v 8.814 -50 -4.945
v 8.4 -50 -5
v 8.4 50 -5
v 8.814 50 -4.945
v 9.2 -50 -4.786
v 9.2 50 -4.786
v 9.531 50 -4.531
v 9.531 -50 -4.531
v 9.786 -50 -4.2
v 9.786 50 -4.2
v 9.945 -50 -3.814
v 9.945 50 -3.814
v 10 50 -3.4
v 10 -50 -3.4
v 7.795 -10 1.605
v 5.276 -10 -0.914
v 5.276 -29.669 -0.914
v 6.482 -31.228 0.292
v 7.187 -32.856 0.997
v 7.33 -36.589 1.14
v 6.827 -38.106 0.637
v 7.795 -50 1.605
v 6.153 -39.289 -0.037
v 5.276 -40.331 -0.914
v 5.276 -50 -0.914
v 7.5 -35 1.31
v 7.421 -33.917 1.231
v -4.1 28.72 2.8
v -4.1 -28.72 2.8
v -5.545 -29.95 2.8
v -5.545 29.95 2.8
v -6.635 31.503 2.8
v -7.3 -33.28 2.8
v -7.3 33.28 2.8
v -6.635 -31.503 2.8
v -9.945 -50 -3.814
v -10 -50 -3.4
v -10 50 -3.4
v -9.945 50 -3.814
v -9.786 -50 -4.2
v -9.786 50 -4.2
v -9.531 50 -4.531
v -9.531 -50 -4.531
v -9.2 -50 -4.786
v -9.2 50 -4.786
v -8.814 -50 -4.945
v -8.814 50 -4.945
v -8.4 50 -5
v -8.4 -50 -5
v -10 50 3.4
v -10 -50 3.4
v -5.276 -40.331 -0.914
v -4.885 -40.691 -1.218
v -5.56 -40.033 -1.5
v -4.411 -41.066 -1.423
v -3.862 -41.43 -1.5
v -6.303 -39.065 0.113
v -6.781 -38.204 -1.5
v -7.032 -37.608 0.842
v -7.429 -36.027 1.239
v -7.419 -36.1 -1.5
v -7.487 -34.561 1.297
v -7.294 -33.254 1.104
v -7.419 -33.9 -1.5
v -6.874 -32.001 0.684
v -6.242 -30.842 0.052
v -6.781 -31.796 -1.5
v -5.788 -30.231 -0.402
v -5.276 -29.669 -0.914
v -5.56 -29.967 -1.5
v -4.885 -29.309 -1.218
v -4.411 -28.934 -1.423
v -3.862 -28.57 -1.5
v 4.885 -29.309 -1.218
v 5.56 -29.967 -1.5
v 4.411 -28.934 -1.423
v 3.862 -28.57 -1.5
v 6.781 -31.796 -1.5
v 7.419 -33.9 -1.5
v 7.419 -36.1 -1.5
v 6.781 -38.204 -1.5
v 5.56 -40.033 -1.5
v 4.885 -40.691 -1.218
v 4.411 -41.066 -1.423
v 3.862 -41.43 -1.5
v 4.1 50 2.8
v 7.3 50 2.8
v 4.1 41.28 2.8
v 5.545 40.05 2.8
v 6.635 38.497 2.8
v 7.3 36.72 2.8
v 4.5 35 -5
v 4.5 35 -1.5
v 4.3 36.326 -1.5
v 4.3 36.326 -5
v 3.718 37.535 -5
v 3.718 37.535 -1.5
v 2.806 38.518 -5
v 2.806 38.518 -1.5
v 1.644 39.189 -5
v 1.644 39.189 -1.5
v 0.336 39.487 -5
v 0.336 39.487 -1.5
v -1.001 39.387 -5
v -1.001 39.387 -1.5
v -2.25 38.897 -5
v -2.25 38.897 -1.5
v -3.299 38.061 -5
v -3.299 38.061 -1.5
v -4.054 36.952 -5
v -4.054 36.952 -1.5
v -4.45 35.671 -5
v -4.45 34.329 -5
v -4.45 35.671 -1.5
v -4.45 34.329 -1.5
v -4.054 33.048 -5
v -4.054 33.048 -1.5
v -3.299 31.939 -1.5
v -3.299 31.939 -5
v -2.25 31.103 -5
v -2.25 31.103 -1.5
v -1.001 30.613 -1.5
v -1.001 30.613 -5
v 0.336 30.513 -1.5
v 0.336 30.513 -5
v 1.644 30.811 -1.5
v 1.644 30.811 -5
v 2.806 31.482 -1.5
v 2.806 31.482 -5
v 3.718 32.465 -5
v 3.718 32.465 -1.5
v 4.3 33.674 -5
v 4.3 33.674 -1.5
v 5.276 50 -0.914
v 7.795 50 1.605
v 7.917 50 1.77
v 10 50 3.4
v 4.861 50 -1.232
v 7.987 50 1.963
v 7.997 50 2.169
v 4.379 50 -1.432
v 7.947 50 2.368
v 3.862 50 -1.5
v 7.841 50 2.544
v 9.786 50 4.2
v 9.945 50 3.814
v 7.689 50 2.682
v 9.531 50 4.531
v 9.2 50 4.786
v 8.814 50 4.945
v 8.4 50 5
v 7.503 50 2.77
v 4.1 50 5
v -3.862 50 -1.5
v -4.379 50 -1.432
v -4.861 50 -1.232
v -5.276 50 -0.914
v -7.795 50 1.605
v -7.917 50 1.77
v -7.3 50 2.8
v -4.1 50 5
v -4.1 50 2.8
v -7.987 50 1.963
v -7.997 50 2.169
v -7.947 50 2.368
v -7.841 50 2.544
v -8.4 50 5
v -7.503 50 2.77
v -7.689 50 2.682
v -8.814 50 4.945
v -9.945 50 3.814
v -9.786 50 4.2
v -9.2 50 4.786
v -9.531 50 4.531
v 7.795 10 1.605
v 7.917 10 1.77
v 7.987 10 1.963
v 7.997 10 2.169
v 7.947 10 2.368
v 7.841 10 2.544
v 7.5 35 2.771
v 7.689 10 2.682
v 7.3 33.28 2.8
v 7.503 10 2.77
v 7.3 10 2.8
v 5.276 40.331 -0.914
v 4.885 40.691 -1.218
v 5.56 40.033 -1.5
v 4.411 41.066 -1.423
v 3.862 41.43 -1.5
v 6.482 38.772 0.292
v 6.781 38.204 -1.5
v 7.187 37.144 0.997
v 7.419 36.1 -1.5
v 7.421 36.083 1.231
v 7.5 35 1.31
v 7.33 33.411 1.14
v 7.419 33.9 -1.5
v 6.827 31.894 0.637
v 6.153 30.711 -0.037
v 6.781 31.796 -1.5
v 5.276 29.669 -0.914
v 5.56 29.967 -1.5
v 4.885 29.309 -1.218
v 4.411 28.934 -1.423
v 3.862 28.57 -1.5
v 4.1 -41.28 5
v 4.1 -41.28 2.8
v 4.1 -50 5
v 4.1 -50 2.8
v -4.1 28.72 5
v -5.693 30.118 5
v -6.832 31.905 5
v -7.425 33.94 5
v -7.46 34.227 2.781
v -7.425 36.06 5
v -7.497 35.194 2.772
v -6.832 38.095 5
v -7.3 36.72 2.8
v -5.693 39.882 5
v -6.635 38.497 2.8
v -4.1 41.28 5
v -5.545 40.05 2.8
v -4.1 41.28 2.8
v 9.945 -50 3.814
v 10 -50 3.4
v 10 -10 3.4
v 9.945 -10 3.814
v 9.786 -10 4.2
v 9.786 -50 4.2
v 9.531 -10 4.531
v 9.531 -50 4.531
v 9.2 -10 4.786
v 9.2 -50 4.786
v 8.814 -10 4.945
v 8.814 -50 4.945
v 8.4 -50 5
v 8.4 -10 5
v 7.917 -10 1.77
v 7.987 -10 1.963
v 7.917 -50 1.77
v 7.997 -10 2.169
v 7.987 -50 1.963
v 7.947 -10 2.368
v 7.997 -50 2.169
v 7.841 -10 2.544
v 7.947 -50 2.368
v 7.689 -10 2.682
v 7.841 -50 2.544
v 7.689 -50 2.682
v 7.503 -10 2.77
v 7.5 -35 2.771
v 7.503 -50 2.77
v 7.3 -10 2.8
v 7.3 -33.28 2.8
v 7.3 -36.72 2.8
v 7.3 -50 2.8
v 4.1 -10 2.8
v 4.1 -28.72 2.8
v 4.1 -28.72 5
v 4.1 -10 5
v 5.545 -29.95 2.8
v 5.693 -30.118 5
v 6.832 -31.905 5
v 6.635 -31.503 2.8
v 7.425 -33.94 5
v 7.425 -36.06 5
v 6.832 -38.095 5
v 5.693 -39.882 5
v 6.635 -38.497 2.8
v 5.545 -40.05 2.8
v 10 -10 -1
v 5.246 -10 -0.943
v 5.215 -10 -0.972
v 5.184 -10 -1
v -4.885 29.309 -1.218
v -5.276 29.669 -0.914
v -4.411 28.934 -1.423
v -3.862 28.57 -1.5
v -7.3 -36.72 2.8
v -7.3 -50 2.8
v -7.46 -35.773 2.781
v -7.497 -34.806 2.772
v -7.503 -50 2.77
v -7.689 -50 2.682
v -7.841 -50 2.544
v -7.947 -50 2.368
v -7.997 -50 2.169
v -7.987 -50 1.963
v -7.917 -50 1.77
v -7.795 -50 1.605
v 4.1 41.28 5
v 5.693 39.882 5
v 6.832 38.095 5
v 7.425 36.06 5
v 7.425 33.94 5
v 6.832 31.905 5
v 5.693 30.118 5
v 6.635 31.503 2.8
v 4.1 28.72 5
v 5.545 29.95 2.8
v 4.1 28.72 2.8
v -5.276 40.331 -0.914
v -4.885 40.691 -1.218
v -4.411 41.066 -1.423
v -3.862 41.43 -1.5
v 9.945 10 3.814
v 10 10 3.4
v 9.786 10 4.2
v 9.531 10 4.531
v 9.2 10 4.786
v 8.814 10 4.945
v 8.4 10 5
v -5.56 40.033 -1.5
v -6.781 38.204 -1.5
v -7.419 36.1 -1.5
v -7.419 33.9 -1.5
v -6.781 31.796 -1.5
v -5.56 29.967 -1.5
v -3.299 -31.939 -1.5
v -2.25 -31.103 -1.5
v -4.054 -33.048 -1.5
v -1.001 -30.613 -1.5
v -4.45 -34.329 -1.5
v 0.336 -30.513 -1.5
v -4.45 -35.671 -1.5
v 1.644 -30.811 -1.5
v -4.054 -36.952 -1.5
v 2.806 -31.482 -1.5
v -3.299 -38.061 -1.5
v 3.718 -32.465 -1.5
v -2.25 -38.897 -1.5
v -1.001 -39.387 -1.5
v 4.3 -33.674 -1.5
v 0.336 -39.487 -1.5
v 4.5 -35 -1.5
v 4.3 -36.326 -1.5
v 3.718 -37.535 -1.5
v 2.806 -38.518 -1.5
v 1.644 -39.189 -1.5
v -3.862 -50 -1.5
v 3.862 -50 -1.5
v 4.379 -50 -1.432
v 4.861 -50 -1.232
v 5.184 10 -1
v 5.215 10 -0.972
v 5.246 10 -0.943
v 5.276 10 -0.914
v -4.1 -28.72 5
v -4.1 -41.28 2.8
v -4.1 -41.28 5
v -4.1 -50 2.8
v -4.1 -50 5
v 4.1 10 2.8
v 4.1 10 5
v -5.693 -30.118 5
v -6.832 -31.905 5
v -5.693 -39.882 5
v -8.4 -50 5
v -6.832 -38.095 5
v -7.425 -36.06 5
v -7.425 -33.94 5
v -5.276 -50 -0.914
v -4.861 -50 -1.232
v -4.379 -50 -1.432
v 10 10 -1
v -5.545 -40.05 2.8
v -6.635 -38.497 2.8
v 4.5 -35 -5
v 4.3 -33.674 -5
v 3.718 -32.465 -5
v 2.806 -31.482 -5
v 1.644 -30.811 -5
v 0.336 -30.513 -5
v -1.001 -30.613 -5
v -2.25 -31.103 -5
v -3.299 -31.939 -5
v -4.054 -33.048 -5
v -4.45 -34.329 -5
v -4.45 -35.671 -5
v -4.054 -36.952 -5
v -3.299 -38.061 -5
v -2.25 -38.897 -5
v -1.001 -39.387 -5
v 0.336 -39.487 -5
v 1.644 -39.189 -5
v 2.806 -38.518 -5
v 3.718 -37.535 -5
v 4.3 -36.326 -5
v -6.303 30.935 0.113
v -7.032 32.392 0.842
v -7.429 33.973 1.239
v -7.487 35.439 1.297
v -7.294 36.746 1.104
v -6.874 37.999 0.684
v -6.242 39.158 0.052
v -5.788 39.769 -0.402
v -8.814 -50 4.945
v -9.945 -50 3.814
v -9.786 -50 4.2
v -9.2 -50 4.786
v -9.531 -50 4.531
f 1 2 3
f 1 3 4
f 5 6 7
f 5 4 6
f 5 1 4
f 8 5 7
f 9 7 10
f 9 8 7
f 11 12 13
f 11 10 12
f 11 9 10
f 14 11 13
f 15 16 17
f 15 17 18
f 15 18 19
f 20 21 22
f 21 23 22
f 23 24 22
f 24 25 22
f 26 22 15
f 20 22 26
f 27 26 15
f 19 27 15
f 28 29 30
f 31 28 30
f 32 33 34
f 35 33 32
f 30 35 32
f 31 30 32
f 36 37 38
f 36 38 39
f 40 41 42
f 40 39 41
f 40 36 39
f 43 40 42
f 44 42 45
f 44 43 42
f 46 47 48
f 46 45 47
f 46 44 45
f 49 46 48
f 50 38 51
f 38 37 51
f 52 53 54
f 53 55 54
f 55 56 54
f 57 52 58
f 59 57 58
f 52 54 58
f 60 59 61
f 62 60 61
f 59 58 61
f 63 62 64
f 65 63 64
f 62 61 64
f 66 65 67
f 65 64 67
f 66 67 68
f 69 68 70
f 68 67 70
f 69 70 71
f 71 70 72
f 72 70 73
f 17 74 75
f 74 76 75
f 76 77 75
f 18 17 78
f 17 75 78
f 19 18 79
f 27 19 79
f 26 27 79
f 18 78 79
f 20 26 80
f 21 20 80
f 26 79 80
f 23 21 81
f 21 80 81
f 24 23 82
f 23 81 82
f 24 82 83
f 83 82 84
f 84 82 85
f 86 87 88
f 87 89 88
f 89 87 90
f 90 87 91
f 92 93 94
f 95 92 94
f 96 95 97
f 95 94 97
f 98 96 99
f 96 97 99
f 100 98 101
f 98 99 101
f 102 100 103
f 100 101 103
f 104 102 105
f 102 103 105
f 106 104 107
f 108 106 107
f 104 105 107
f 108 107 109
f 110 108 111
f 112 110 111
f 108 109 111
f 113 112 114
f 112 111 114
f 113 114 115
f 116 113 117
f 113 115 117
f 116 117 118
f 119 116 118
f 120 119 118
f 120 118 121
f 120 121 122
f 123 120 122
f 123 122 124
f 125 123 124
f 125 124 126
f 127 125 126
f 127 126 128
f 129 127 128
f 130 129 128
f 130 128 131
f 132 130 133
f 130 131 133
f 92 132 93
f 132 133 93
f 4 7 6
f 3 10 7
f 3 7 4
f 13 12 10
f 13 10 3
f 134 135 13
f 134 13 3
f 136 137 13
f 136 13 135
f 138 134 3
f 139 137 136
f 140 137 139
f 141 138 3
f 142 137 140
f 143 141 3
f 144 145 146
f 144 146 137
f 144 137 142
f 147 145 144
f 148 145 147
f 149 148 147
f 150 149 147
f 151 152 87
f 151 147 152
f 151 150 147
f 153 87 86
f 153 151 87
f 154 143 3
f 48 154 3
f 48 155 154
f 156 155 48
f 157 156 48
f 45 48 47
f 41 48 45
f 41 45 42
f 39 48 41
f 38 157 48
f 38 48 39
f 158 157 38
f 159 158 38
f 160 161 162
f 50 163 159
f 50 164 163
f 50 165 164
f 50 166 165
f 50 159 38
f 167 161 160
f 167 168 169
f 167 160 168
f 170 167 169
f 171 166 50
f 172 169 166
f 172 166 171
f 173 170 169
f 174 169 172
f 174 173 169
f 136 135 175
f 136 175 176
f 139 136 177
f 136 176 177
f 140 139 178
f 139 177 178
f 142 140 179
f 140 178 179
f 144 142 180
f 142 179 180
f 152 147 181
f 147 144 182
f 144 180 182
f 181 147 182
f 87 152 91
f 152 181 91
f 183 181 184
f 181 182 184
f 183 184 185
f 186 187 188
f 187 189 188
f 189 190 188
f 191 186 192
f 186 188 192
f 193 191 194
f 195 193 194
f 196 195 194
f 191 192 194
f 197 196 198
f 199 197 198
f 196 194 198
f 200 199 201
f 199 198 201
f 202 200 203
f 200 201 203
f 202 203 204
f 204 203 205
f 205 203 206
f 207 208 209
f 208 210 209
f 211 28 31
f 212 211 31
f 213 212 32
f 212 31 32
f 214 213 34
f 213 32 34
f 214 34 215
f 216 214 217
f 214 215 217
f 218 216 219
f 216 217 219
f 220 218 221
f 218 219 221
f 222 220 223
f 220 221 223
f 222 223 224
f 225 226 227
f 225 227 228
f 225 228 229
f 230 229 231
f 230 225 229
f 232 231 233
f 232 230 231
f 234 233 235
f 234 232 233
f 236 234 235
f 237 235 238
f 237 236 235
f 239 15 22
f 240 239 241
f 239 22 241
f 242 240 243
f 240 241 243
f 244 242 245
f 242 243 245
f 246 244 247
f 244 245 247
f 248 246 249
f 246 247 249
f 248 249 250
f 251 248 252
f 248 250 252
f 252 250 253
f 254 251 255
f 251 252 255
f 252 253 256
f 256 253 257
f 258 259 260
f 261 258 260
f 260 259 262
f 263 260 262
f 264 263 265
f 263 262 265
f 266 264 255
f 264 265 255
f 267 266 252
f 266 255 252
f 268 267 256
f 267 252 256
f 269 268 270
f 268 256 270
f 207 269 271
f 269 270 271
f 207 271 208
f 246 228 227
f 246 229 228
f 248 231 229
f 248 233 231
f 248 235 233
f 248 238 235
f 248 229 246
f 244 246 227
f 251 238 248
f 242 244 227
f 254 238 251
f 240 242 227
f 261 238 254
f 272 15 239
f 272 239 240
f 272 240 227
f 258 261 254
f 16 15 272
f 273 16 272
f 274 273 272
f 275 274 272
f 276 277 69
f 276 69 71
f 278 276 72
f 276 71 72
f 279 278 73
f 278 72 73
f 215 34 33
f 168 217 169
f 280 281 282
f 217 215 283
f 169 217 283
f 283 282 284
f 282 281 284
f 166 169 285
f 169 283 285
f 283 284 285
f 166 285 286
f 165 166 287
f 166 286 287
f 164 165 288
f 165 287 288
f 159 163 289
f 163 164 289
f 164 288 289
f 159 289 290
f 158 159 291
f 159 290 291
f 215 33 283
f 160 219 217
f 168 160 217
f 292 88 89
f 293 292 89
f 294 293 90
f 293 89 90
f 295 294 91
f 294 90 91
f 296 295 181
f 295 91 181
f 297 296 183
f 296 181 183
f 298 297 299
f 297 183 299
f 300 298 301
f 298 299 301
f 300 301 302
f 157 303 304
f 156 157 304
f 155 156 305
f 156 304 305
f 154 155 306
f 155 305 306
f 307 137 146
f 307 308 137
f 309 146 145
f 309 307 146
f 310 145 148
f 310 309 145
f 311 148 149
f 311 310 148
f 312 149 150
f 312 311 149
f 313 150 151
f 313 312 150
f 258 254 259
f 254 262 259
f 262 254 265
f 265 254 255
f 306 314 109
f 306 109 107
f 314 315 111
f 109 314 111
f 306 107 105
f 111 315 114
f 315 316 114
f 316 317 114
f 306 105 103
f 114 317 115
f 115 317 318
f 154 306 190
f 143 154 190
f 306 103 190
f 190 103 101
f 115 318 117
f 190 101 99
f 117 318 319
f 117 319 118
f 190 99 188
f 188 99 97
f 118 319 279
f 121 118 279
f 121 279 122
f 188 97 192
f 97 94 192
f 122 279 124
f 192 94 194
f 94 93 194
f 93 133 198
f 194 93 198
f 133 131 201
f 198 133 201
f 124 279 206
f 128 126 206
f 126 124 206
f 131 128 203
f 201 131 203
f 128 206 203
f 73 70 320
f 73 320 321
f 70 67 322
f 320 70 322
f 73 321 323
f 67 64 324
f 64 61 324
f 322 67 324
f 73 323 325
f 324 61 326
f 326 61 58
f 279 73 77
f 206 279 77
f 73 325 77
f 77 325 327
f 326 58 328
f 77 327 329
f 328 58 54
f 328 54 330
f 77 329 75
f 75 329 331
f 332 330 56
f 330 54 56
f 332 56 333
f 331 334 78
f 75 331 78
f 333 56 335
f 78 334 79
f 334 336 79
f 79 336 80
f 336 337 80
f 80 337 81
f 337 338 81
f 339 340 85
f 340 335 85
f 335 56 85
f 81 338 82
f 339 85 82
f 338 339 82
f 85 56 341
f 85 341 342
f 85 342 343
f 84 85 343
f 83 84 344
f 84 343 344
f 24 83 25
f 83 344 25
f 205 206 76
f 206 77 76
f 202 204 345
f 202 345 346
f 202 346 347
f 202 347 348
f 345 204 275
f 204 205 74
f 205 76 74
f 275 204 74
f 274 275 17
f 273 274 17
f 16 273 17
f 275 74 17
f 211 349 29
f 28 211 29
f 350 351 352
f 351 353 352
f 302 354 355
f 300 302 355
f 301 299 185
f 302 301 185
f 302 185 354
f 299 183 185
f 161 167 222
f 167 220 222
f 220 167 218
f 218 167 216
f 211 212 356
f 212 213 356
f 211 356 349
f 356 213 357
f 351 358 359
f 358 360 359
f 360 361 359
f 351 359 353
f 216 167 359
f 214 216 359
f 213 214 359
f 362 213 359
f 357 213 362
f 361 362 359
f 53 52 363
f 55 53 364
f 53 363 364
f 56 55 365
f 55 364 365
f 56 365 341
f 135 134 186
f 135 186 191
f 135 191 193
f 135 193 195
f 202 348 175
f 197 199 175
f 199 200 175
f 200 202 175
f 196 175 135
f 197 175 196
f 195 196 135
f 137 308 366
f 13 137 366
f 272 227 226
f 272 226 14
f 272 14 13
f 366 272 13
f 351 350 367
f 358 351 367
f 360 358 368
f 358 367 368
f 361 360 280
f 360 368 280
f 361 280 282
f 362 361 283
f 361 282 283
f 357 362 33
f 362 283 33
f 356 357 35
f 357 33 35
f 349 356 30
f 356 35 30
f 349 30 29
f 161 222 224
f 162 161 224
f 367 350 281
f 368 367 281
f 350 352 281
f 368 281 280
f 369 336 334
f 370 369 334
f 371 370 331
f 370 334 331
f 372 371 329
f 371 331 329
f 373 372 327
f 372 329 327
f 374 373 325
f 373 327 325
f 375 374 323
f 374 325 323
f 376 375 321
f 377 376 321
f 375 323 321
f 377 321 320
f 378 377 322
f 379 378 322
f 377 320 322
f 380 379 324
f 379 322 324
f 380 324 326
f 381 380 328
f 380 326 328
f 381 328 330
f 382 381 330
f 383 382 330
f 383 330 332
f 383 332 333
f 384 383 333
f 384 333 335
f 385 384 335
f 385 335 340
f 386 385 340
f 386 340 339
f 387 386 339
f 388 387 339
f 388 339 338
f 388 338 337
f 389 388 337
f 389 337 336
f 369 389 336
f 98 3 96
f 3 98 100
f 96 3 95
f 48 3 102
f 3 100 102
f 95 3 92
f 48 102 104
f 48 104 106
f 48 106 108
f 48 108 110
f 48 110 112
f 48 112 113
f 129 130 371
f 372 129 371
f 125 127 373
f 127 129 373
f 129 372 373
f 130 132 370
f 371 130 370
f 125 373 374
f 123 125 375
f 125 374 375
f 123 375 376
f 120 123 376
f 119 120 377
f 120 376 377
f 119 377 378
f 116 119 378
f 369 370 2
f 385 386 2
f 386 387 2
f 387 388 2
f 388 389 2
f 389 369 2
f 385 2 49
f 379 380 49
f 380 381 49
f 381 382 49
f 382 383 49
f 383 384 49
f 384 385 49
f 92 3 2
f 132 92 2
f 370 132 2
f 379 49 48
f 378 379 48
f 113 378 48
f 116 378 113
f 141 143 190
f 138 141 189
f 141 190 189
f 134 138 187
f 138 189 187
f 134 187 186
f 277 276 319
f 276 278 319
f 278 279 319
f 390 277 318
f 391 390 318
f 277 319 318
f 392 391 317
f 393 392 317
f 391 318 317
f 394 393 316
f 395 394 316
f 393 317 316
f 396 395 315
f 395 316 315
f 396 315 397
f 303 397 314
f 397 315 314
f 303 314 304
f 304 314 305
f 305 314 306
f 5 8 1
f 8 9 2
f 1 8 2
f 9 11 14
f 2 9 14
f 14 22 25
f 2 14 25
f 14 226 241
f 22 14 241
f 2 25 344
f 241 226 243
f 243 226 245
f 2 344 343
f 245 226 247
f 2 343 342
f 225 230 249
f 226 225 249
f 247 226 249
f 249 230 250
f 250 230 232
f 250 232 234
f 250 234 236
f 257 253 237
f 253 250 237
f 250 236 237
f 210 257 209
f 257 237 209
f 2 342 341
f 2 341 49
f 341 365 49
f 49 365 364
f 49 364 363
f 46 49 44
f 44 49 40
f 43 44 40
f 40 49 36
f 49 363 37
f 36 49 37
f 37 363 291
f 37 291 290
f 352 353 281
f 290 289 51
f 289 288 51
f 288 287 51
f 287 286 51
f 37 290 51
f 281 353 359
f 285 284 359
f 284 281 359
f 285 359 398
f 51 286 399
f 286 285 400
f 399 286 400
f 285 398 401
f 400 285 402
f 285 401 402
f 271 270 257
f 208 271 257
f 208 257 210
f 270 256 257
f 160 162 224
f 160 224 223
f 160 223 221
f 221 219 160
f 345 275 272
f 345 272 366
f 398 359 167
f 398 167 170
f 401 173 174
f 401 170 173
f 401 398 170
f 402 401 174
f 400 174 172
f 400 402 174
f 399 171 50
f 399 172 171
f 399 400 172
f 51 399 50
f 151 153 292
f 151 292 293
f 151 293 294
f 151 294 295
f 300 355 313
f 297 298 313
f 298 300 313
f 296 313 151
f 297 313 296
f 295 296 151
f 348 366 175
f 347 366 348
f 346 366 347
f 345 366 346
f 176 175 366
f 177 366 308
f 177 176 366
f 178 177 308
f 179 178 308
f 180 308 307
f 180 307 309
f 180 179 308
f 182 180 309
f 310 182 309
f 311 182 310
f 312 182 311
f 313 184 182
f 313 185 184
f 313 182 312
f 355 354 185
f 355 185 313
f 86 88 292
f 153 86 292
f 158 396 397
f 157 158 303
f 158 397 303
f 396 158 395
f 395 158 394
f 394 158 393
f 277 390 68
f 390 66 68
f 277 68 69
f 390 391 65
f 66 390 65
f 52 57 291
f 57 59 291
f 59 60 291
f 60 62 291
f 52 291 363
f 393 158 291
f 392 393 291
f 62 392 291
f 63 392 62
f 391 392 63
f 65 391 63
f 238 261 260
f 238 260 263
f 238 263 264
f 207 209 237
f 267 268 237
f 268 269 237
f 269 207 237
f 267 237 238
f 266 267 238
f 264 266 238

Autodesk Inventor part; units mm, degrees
sketch "Skizze_1" plane through (0, 0, 0) normal (0, 1, 0) x (-1, 0, 0)
  arc A0 (10, 3.4) -> (8.4, 5) centre (8.4, 3.4) ccw
  line L0 (8.4, 5) -> (4.1, 5)
  line L1 (4.1, 5) -> (4.1, 2.8)
  line L2 (4.1, 2.8) -> (7.3, 2.8)
  arc A1 (7.795, 1.605) -> (7.3, 2.8) centre (7.3, 2.1) ccw
  line L3 (7.795, 1.605) -> (5.2757, -0.9142)
  arc A2 (3.8615, -1.5) -> (5.2757, -0.9142) centre (3.8615, 0.5) ccw
  line L4 (3.8615, -1.5) -> (-3.8615, -1.5)
  arc A3 (-5.2757, -0.9142) -> (-3.8615, -1.5) centre (-3.8615, 0.5) ccw
  line L5 (-5.2757, -0.9142) -> (-7.795, 1.605)
  arc A4 (-7.3, 2.8) -> (-7.795, 1.605) centre (-7.3, 2.1) ccw
  line L6 (-7.3, 2.8) -> (-4.1, 2.8)
  line L7 (-4.1, 2.8) -> (-4.1, 5)
  line L8 (-4.1, 5) -> (-8.4, 5)
  arc A5 (-8.4, 5) -> (-10, 3.4) centre (-8.4, 3.4) ccw
  line L9 (-10, 3.4) -> (-10, -3.4)
  arc A6 (-10, -3.4) -> (-8.4, -5) centre (-8.4, -3.4) ccw
  line L10 (-8.4, -5) -> (8.4, -5)
  arc A7 (8.4, -5) -> (10, -3.4) centre (8.4, -3.4) ccw
  line L11 (10, -3.4) -> (10, 3.4)
extrude "Extrusion1" add sketch "Skizze_1" along normal mid plane 100
sketch "Skizze_2" plane through (0, 0, 0) normal (1, 0, 0) x (0, 1, 0)
  line L0 (10, 9) -> (-10, 9)
  line L1 (-10, 9) -> (-10, -1)
  line L2 (-10, -1) -> (10, -1)
  line L3 (10, -1) -> (10, 9)
extrude "Extrusion2" cut sketch "Skizze_2" along normal blind 15
sketch "Skizze_3_ALT_Drilling_1" plane through (0, 0, 0) normal (0, 0, 1) x (1, 0, 0)
  circle A0 centre (0, -35) radius 4.5
extrude "Extrusion3" cut sketch "Skizze_3_ALT_Drilling_1" against normal blind 10
sketch "Skizze_4_ALT_Drilling_2" plane through (0, 0, 0) normal (0, 0, 1) x (1, 0, 0)
  circle A0 centre (0, 35) radius 4.5
extrude "Extrusion4" cut sketch "Skizze_4_ALT_Drilling_2" against normal blind 10
sketch "Skizze_5_ALT_Drilling_3" plane through (0, 0, -1.5) normal (0, 0, 1) x (1, 0, 0)
  circle A0 centre (0, 35) radius 7.5
extrude "Extrusion5" cut sketch "Skizze_5_ALT_Drilling_3" along normal blind 10
sketch "Skizze_6_ALT_Drilling_4" plane through (0, 0, -1.5) normal (0, 0, 1) x (1, 0, 0)
  circle A0 centre (0, -35) radius 7.5
extrude "Extrusion6" cut sketch "Skizze_6_ALT_Drilling_4" along normal blind 10
ref_plane "side_1_XY" through (0, 0, -5) normal (0, 0, -1) x (-1, 0, 0)
ref_plane "side_1_YZ" through (0, 0, -5) normal (-1, 0, 0) x (0, 1, 0)
ref_plane "side_1_ZX" through (0, 0, -5) normal (0, 1, 0) x (0, 0, -1)
ref_plane "side_6a_XY" through (0, 35, 5) normal (0, 0, 1) x (1, 0, 0)
ref_plane "side_6a_YZ" through (0, 35, 5) normal (1, 0, 0) x (0, 1, 0)
ref_plane "side_6a_ZX" through (0, 35, 5) normal (0, 1, 0) x (0, 0, 1)
ref_plane "side_6b_XY" through (0, -35, 5) normal (0, 0, 1) x (1, 0, 0)
ref_plane "side_6b_YZ" through (0, -35, 5) normal (1, 0, 0) x (0, 1, 0)
ref_plane "side_6b_ZX" through (0, -35, 5) normal (0, 1, 0) x (0, 0, 1)
properties part number "MayTec 1.68.201050_Hanging bracket"
